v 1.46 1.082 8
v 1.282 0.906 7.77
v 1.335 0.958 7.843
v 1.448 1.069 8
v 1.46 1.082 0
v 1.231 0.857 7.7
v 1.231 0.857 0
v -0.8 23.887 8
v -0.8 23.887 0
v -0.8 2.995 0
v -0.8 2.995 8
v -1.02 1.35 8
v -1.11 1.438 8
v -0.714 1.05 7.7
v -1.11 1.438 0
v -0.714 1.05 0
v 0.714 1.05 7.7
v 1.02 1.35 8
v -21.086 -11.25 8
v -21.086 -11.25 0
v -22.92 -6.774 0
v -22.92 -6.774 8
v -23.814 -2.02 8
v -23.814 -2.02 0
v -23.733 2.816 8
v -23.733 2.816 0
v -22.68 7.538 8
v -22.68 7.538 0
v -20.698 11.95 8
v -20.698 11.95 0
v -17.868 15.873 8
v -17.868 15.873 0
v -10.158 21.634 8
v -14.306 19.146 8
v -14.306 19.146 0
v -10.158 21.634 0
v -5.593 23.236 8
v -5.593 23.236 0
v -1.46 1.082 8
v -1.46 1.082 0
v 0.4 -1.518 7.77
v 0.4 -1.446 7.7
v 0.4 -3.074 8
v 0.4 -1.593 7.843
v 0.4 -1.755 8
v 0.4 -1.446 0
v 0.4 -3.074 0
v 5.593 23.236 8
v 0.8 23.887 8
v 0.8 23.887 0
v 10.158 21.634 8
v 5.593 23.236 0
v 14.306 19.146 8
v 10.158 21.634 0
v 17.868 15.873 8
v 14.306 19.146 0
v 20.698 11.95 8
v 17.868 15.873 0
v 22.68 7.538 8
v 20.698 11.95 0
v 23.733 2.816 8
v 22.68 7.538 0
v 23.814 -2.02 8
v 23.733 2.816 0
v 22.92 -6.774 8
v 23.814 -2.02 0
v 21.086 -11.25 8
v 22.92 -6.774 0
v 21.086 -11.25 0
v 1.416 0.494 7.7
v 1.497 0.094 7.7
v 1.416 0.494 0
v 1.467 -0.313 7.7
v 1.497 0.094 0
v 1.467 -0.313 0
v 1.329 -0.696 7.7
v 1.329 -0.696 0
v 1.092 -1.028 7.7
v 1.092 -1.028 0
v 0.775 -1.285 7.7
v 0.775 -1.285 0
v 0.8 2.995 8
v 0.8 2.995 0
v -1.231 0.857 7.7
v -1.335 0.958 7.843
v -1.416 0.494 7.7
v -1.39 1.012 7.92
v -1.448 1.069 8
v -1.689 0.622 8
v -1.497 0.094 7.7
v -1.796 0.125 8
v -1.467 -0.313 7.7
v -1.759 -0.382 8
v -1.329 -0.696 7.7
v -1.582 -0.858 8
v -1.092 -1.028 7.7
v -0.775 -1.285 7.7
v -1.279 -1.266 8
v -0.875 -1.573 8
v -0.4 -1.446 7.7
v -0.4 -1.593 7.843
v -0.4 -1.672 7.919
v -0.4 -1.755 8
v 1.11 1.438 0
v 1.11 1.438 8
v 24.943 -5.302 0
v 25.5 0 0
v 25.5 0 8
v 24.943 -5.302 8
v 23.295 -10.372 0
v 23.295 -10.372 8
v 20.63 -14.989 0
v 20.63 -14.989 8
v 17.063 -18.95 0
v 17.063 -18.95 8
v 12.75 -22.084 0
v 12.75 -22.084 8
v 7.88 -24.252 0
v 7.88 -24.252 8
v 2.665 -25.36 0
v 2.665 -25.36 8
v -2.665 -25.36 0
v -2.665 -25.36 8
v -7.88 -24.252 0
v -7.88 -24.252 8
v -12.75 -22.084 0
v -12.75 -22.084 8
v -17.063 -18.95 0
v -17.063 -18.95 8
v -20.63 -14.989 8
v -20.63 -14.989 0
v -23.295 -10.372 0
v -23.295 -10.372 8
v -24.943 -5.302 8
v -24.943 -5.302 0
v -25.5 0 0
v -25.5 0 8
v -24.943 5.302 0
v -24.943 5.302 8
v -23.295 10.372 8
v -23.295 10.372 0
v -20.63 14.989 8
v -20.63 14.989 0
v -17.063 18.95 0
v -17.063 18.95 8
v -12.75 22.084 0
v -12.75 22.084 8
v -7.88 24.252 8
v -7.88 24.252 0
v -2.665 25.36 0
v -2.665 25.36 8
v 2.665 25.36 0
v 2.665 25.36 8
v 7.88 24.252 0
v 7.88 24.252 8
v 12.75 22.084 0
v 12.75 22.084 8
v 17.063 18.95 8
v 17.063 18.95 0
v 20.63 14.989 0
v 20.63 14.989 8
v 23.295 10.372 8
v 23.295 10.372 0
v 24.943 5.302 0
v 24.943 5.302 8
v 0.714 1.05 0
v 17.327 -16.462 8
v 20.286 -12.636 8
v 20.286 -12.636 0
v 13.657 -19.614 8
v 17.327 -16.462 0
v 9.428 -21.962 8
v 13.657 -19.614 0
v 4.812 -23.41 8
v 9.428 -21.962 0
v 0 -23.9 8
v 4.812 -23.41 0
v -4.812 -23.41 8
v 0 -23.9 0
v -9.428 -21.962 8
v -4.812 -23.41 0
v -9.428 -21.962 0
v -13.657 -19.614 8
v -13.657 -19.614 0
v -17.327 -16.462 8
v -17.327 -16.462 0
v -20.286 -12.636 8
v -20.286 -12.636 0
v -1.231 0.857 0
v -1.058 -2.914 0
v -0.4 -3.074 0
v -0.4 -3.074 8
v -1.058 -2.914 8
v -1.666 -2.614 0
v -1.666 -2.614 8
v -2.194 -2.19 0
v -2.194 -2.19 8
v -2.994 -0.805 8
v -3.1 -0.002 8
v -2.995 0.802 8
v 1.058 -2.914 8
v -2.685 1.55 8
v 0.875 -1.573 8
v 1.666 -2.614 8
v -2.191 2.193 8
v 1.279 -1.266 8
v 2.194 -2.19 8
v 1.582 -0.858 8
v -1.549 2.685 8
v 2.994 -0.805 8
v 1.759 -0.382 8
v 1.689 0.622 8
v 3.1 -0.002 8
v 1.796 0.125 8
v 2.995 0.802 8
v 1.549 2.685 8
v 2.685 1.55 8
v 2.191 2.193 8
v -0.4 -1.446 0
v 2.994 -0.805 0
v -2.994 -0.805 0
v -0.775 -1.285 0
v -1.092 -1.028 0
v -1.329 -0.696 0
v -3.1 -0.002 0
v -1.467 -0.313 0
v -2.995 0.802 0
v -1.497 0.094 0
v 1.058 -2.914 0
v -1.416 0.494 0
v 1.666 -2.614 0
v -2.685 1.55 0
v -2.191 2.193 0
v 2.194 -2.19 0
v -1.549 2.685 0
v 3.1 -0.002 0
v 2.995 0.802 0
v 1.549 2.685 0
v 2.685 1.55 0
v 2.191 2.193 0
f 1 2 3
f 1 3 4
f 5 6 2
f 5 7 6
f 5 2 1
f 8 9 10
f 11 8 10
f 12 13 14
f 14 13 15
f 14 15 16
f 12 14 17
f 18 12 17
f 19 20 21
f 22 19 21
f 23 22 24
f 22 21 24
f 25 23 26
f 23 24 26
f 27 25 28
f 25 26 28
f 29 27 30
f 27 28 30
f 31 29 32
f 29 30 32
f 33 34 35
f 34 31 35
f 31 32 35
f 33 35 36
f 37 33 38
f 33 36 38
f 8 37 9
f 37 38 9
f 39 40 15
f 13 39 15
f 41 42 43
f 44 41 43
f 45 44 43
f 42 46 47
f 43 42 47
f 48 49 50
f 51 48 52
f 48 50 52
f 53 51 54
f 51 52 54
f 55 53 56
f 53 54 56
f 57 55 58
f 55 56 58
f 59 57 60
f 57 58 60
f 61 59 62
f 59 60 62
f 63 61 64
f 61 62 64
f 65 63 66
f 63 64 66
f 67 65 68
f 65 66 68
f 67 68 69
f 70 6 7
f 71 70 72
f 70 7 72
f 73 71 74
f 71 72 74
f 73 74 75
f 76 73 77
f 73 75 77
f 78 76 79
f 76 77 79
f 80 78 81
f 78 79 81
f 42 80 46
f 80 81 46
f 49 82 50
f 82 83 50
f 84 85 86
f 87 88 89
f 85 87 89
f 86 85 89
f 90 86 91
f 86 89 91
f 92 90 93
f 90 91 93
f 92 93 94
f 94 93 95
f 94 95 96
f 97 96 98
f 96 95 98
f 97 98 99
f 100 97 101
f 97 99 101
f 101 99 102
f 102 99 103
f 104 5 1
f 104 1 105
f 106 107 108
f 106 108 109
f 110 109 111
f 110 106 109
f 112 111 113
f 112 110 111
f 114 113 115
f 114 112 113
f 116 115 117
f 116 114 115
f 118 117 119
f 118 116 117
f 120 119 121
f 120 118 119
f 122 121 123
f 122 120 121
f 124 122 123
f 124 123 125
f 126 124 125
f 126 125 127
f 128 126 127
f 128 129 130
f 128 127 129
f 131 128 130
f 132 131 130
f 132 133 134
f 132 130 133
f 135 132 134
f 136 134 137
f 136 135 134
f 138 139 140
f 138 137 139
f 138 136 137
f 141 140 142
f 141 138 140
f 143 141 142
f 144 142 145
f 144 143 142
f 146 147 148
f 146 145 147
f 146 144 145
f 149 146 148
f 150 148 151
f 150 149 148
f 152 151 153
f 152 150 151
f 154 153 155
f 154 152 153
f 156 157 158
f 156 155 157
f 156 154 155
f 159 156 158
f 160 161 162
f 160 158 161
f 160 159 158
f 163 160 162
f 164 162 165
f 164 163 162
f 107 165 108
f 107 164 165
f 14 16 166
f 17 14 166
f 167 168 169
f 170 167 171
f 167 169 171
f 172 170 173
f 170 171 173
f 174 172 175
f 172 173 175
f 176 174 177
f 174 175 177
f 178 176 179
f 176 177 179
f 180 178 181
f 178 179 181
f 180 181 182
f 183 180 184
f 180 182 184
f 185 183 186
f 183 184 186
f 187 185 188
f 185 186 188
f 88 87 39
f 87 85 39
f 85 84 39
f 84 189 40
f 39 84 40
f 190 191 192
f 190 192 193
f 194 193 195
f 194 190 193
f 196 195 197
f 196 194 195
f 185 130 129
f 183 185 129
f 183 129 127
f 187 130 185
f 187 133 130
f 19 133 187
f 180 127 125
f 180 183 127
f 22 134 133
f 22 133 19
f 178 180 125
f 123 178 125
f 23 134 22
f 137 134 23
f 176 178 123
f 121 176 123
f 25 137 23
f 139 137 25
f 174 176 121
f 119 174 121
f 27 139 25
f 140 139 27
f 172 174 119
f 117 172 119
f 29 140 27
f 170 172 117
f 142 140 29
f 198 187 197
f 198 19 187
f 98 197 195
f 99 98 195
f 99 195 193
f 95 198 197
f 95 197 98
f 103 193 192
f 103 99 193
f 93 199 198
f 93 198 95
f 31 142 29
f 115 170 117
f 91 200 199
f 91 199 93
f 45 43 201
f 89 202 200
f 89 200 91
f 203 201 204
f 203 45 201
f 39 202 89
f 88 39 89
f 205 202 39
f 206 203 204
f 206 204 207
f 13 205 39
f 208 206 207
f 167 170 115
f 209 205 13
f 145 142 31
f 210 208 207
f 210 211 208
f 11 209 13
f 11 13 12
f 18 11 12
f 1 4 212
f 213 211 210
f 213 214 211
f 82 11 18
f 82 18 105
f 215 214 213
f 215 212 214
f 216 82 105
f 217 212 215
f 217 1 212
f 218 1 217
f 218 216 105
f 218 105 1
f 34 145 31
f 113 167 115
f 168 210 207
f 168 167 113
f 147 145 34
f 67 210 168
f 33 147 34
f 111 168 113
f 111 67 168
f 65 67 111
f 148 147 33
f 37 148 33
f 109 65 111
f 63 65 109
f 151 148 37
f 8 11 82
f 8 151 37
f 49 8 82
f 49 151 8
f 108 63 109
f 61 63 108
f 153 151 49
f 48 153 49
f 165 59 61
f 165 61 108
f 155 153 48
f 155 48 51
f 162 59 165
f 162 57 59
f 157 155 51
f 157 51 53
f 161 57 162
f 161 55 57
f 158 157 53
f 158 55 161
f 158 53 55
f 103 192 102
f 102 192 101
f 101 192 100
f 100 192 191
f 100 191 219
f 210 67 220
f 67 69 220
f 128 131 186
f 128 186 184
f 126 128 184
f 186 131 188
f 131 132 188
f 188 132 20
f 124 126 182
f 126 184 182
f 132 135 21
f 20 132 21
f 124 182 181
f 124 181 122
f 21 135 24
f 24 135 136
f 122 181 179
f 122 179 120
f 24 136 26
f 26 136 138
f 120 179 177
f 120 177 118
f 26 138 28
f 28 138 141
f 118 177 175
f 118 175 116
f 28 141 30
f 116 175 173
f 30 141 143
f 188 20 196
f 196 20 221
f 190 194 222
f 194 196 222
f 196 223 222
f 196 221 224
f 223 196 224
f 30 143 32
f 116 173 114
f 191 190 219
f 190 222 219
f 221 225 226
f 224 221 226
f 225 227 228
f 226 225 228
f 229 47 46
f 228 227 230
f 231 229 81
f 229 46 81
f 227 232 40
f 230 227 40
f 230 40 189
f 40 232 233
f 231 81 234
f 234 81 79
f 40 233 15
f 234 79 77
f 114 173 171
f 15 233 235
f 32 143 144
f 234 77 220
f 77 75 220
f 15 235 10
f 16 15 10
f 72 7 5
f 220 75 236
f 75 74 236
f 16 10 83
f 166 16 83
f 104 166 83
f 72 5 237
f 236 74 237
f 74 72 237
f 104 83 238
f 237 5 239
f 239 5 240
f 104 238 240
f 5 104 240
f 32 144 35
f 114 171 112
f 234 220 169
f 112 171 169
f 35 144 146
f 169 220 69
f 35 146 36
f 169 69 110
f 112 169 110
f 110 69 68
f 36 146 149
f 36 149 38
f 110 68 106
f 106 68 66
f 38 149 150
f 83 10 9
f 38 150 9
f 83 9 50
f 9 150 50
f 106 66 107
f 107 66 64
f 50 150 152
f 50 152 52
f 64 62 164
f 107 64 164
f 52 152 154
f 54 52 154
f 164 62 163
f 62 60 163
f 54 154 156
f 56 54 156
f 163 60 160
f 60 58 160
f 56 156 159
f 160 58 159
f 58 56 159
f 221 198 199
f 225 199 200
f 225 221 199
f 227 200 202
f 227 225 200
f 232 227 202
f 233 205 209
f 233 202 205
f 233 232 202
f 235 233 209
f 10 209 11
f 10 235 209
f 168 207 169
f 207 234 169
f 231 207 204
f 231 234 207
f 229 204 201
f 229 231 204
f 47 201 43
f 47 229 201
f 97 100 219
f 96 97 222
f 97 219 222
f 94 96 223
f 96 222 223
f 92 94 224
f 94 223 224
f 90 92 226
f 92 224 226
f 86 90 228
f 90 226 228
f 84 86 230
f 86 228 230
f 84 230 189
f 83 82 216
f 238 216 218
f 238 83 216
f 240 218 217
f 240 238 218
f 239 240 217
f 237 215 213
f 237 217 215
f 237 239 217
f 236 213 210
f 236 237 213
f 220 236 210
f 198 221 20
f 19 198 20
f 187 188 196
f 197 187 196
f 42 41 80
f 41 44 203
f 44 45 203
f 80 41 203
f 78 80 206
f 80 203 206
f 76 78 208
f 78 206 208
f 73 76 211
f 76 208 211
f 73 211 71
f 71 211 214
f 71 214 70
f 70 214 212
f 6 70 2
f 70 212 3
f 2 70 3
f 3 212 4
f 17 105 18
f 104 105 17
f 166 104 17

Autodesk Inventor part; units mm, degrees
ref_plane "YZ Plane" through (0, 0, 0) normal (1, 0, 0) x (0, 1, 0)
ref_plane "XZ Plane" through (0, 0, 0) normal (0, 1, 0) x (-1, 0, 0)
ref_plane "XY Plane" through (0, 0, 0) normal (0, 0, 1) x (1, 0, 0)
sketch "スケッチ1" plane through (0, 0, 0) normal (0, 0, 1) x (1, 0, 0)
  circle A0 centre (0, 0) radius 1.5
  circle A1 centre (0, 0) radius 3.1
  line L0 (-0.4, 0) -> (0.4, 0)
  line L1 (0.4, 0) -> (0.4, -3.1)
  line L2 (0.4, -3.1) -> (-0.4, -3.1)
  line L3 (-0.4, -3.1) -> (-0.4, 0)
  line L4 (-1.0712, 1.05) -> (1.0712, 1.05)
  circle A2 centre (0, 0) radius 25.5
  circle A3 centre (0, 0) radius 23.9
  line L5 (-1.4605, 1.0815) -> (-1.1105, 1.4385)
  line L6 (-1.1105, 1.4385) -> (0.175, 0.1785)
  line L7 (0.175, 0.1785) -> (-0.175, -0.1785)
  line L8 (-0.175, -0.1785) -> (-1.4605, 1.0815)
  line L9 (1.4605, 1.0815) -> (1.1105, 1.4385)
  line L10 (1.1105, 1.4385) -> (-0.175, 0.1785)
  line L11 (-0.175, 0.1785) -> (0.175, -0.1785)
  line L12 (0.175, -0.1785) -> (1.4605, 1.0815)
  line L13 (0, 0) -> (-1.0712, 1.05) construction
  line L14 (1.0712, 1.05) -> (0, 0) construction
  point P0 (0.4, -1.4457)
  point P1 (0.4, -3.0741)
  point P2 (-0.4, -3.0741)
  point P3 (-0.4, -1.4457)
  point P4 (-0.7141, 1.05)
  point P5 (0.7141, 1.05)
  point P6 (1.2312, 0.8568)
  point P7 (-1.2312, 0.8568)
  dimension "SHAFT_D" = 3
  dimension "SLIT" = 0.8
  dimension "HUB_THIN" = 1.6
  dimension "d3" = 1.05
  dimension "WHEEL_D" = 51
  dimension "d5" = 1.6
  dimension "d18" = 0.5
  dimension "d19" = 1.8
extrude "ハブ＆リム" add sketch "スケッチ1" along normal blind 8 contours A0 L12 L9 L10 L6 L5 L8 L3 A1 L1 | L10 L4 L6 A0 | A2
sketch "スケッチ2" plane through (0, 0, 0) normal (0, 0, 1) x (1, 0, 0)
  line L0 (-0.8, 2.6) -> (0.8, 2.6)
  line L1 (0.8, 2.6) -> (0.8, 23.9)
  line L2 (0.8, 23.9) -> (-0.8, 23.9)
  line L3 (-0.8, 23.9) -> (-0.8, 2.6)
  circle A0 centre (0, 0) radius 23.9 projected
  point P0 (0, 23.9)
  dimension "d8" = 1.6
  dimension "d9" = 2.6
extrude "スポーク" add sketch "スケッチ2" along normal up to surface (8 mm away) contours L3 A0 L1 L0 | L3 L2 A0 | A0 L2 L1 picked at (0, 9.7)
pattern_circular "円形状パターン1" count 3 over 360 about axis through (0, 0, -10) along (0, 0, 1) of "スポーク"
chamfer "面取り1" distance 0.3 angle 45 3 edges at (-1.4109, -0.5094, 8) (0, 1.05, 8) (1.4109, -0.5094, 8)
equation "\"d5\" = HUB_THIN"
properties part number "D-Shaft_Wheel3"
